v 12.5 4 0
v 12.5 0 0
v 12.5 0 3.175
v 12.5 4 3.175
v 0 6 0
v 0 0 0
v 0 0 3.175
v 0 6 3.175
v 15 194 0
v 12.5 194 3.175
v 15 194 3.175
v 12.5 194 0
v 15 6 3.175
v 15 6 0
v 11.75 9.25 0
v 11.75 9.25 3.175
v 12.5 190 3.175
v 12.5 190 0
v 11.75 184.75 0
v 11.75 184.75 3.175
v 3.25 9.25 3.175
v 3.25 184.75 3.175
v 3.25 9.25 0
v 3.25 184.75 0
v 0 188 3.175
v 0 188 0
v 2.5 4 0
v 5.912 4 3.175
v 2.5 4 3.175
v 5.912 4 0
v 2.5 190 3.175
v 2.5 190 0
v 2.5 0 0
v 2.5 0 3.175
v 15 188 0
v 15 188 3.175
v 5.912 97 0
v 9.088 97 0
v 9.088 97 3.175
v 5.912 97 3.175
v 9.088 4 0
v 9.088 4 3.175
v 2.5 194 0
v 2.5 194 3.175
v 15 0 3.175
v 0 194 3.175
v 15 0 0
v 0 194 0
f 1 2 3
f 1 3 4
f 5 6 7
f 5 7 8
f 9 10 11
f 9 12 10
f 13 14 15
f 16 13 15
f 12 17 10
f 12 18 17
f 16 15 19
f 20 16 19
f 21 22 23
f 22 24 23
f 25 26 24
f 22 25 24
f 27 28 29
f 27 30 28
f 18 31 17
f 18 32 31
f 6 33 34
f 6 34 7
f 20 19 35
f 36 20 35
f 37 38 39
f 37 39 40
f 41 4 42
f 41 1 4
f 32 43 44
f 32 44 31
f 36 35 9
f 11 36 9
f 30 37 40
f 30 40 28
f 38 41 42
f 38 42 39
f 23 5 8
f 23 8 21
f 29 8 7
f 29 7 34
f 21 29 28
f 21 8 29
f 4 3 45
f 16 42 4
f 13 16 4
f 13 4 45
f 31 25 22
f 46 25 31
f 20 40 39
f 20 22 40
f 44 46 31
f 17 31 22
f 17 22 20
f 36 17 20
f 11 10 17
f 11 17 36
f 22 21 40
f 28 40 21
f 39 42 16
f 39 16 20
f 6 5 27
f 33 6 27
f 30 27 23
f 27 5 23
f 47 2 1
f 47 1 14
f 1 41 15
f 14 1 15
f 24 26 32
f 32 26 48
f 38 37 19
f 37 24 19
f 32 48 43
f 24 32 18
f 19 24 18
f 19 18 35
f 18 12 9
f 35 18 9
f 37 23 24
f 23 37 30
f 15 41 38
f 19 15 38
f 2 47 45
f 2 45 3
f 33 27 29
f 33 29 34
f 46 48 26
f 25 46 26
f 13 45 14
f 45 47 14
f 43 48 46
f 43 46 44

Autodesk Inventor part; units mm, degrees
ref_plane "YZ Plane" through (0, 0, 0) normal (1, 0, 0) x (0, 1, 0)
ref_plane "XZ Plane" through (0, 0, 0) normal (0, 1, 0) x (-1, 0, 0)
ref_plane "XY Plane" through (0, 0, 0) normal (0, 0, 1) x (1, 0, 0)
sketch "Sketch1" plane through (0, 0, 0) normal (0, 0, 1) x (1, 0, 0)
  line L0 (15, 0) -> (12.5, 0)
  line L1 (12.5, 0) -> (12.5, 4)
  line L2 (2.5, 4) -> (2.5, 0)
  line L3 (2.5, 0) -> (0, 0)
  line L4 (12.5, 4) -> (9.0875, 4)
  line L5 (9.0875, 4) -> (9.0875, 97)
  line L6 (9.0875, 97) -> (5.9125, 97)
  line L7 (5.9125, 97) -> (5.9125, 4)
  line L8 (5.9125, 4) -> (2.5, 4)
  line L9 (0, 194) -> (2.5, 194)
  line L10 (2.5, 194) -> (2.5, 190)
  line L11 (2.5, 190) -> (12.5, 190)
  line L12 (12.5, 190) -> (12.5, 194)
  line L13 (12.5, 194) -> (15, 194)
  line L14 (0, 194) -> (0, 188)
  line L15 (0, 188) -> (3.25, 184.75)
  line L16 (3.25, 184.75) -> (3.25, 9.25)
  line L17 (0, 0) -> (0, 6)
  line L18 (0, 6) -> (3.25, 9.25)
  line L19 (15, 0) -> (15, 6)
  line L20 (15, 6) -> (11.75, 9.25)
  line L21 (11.75, 9.25) -> (11.75, 184.75)
  line L22 (11.75, 184.75) -> (15, 188)
  line L23 (15, 188) -> (15, 194)
  dimension "d1" = 10
  dimension "d2" = 3.175
  dimension "d4" = 194
  dimension "d7" = 97
  dimension "d10" = 6
  dimension "d13" = 15
  dimension "d14" = 45
  dimension "d15" = 4
  dimension "d16" = 8.5
extrude "Extrusion1" add sketch "Sketch1" along normal blind 3.175
equation "\"d2\" = THICKA"
equation "\"d7\" = 0.5 * d4"
equation "\"d8\" = THICKA"
equation "\"THICKA\" = 3.175"
equation "\"THICKB\" = 6.731"
equation "\"THICKC\" = 12.7"
properties part number "Effector_Arm"
